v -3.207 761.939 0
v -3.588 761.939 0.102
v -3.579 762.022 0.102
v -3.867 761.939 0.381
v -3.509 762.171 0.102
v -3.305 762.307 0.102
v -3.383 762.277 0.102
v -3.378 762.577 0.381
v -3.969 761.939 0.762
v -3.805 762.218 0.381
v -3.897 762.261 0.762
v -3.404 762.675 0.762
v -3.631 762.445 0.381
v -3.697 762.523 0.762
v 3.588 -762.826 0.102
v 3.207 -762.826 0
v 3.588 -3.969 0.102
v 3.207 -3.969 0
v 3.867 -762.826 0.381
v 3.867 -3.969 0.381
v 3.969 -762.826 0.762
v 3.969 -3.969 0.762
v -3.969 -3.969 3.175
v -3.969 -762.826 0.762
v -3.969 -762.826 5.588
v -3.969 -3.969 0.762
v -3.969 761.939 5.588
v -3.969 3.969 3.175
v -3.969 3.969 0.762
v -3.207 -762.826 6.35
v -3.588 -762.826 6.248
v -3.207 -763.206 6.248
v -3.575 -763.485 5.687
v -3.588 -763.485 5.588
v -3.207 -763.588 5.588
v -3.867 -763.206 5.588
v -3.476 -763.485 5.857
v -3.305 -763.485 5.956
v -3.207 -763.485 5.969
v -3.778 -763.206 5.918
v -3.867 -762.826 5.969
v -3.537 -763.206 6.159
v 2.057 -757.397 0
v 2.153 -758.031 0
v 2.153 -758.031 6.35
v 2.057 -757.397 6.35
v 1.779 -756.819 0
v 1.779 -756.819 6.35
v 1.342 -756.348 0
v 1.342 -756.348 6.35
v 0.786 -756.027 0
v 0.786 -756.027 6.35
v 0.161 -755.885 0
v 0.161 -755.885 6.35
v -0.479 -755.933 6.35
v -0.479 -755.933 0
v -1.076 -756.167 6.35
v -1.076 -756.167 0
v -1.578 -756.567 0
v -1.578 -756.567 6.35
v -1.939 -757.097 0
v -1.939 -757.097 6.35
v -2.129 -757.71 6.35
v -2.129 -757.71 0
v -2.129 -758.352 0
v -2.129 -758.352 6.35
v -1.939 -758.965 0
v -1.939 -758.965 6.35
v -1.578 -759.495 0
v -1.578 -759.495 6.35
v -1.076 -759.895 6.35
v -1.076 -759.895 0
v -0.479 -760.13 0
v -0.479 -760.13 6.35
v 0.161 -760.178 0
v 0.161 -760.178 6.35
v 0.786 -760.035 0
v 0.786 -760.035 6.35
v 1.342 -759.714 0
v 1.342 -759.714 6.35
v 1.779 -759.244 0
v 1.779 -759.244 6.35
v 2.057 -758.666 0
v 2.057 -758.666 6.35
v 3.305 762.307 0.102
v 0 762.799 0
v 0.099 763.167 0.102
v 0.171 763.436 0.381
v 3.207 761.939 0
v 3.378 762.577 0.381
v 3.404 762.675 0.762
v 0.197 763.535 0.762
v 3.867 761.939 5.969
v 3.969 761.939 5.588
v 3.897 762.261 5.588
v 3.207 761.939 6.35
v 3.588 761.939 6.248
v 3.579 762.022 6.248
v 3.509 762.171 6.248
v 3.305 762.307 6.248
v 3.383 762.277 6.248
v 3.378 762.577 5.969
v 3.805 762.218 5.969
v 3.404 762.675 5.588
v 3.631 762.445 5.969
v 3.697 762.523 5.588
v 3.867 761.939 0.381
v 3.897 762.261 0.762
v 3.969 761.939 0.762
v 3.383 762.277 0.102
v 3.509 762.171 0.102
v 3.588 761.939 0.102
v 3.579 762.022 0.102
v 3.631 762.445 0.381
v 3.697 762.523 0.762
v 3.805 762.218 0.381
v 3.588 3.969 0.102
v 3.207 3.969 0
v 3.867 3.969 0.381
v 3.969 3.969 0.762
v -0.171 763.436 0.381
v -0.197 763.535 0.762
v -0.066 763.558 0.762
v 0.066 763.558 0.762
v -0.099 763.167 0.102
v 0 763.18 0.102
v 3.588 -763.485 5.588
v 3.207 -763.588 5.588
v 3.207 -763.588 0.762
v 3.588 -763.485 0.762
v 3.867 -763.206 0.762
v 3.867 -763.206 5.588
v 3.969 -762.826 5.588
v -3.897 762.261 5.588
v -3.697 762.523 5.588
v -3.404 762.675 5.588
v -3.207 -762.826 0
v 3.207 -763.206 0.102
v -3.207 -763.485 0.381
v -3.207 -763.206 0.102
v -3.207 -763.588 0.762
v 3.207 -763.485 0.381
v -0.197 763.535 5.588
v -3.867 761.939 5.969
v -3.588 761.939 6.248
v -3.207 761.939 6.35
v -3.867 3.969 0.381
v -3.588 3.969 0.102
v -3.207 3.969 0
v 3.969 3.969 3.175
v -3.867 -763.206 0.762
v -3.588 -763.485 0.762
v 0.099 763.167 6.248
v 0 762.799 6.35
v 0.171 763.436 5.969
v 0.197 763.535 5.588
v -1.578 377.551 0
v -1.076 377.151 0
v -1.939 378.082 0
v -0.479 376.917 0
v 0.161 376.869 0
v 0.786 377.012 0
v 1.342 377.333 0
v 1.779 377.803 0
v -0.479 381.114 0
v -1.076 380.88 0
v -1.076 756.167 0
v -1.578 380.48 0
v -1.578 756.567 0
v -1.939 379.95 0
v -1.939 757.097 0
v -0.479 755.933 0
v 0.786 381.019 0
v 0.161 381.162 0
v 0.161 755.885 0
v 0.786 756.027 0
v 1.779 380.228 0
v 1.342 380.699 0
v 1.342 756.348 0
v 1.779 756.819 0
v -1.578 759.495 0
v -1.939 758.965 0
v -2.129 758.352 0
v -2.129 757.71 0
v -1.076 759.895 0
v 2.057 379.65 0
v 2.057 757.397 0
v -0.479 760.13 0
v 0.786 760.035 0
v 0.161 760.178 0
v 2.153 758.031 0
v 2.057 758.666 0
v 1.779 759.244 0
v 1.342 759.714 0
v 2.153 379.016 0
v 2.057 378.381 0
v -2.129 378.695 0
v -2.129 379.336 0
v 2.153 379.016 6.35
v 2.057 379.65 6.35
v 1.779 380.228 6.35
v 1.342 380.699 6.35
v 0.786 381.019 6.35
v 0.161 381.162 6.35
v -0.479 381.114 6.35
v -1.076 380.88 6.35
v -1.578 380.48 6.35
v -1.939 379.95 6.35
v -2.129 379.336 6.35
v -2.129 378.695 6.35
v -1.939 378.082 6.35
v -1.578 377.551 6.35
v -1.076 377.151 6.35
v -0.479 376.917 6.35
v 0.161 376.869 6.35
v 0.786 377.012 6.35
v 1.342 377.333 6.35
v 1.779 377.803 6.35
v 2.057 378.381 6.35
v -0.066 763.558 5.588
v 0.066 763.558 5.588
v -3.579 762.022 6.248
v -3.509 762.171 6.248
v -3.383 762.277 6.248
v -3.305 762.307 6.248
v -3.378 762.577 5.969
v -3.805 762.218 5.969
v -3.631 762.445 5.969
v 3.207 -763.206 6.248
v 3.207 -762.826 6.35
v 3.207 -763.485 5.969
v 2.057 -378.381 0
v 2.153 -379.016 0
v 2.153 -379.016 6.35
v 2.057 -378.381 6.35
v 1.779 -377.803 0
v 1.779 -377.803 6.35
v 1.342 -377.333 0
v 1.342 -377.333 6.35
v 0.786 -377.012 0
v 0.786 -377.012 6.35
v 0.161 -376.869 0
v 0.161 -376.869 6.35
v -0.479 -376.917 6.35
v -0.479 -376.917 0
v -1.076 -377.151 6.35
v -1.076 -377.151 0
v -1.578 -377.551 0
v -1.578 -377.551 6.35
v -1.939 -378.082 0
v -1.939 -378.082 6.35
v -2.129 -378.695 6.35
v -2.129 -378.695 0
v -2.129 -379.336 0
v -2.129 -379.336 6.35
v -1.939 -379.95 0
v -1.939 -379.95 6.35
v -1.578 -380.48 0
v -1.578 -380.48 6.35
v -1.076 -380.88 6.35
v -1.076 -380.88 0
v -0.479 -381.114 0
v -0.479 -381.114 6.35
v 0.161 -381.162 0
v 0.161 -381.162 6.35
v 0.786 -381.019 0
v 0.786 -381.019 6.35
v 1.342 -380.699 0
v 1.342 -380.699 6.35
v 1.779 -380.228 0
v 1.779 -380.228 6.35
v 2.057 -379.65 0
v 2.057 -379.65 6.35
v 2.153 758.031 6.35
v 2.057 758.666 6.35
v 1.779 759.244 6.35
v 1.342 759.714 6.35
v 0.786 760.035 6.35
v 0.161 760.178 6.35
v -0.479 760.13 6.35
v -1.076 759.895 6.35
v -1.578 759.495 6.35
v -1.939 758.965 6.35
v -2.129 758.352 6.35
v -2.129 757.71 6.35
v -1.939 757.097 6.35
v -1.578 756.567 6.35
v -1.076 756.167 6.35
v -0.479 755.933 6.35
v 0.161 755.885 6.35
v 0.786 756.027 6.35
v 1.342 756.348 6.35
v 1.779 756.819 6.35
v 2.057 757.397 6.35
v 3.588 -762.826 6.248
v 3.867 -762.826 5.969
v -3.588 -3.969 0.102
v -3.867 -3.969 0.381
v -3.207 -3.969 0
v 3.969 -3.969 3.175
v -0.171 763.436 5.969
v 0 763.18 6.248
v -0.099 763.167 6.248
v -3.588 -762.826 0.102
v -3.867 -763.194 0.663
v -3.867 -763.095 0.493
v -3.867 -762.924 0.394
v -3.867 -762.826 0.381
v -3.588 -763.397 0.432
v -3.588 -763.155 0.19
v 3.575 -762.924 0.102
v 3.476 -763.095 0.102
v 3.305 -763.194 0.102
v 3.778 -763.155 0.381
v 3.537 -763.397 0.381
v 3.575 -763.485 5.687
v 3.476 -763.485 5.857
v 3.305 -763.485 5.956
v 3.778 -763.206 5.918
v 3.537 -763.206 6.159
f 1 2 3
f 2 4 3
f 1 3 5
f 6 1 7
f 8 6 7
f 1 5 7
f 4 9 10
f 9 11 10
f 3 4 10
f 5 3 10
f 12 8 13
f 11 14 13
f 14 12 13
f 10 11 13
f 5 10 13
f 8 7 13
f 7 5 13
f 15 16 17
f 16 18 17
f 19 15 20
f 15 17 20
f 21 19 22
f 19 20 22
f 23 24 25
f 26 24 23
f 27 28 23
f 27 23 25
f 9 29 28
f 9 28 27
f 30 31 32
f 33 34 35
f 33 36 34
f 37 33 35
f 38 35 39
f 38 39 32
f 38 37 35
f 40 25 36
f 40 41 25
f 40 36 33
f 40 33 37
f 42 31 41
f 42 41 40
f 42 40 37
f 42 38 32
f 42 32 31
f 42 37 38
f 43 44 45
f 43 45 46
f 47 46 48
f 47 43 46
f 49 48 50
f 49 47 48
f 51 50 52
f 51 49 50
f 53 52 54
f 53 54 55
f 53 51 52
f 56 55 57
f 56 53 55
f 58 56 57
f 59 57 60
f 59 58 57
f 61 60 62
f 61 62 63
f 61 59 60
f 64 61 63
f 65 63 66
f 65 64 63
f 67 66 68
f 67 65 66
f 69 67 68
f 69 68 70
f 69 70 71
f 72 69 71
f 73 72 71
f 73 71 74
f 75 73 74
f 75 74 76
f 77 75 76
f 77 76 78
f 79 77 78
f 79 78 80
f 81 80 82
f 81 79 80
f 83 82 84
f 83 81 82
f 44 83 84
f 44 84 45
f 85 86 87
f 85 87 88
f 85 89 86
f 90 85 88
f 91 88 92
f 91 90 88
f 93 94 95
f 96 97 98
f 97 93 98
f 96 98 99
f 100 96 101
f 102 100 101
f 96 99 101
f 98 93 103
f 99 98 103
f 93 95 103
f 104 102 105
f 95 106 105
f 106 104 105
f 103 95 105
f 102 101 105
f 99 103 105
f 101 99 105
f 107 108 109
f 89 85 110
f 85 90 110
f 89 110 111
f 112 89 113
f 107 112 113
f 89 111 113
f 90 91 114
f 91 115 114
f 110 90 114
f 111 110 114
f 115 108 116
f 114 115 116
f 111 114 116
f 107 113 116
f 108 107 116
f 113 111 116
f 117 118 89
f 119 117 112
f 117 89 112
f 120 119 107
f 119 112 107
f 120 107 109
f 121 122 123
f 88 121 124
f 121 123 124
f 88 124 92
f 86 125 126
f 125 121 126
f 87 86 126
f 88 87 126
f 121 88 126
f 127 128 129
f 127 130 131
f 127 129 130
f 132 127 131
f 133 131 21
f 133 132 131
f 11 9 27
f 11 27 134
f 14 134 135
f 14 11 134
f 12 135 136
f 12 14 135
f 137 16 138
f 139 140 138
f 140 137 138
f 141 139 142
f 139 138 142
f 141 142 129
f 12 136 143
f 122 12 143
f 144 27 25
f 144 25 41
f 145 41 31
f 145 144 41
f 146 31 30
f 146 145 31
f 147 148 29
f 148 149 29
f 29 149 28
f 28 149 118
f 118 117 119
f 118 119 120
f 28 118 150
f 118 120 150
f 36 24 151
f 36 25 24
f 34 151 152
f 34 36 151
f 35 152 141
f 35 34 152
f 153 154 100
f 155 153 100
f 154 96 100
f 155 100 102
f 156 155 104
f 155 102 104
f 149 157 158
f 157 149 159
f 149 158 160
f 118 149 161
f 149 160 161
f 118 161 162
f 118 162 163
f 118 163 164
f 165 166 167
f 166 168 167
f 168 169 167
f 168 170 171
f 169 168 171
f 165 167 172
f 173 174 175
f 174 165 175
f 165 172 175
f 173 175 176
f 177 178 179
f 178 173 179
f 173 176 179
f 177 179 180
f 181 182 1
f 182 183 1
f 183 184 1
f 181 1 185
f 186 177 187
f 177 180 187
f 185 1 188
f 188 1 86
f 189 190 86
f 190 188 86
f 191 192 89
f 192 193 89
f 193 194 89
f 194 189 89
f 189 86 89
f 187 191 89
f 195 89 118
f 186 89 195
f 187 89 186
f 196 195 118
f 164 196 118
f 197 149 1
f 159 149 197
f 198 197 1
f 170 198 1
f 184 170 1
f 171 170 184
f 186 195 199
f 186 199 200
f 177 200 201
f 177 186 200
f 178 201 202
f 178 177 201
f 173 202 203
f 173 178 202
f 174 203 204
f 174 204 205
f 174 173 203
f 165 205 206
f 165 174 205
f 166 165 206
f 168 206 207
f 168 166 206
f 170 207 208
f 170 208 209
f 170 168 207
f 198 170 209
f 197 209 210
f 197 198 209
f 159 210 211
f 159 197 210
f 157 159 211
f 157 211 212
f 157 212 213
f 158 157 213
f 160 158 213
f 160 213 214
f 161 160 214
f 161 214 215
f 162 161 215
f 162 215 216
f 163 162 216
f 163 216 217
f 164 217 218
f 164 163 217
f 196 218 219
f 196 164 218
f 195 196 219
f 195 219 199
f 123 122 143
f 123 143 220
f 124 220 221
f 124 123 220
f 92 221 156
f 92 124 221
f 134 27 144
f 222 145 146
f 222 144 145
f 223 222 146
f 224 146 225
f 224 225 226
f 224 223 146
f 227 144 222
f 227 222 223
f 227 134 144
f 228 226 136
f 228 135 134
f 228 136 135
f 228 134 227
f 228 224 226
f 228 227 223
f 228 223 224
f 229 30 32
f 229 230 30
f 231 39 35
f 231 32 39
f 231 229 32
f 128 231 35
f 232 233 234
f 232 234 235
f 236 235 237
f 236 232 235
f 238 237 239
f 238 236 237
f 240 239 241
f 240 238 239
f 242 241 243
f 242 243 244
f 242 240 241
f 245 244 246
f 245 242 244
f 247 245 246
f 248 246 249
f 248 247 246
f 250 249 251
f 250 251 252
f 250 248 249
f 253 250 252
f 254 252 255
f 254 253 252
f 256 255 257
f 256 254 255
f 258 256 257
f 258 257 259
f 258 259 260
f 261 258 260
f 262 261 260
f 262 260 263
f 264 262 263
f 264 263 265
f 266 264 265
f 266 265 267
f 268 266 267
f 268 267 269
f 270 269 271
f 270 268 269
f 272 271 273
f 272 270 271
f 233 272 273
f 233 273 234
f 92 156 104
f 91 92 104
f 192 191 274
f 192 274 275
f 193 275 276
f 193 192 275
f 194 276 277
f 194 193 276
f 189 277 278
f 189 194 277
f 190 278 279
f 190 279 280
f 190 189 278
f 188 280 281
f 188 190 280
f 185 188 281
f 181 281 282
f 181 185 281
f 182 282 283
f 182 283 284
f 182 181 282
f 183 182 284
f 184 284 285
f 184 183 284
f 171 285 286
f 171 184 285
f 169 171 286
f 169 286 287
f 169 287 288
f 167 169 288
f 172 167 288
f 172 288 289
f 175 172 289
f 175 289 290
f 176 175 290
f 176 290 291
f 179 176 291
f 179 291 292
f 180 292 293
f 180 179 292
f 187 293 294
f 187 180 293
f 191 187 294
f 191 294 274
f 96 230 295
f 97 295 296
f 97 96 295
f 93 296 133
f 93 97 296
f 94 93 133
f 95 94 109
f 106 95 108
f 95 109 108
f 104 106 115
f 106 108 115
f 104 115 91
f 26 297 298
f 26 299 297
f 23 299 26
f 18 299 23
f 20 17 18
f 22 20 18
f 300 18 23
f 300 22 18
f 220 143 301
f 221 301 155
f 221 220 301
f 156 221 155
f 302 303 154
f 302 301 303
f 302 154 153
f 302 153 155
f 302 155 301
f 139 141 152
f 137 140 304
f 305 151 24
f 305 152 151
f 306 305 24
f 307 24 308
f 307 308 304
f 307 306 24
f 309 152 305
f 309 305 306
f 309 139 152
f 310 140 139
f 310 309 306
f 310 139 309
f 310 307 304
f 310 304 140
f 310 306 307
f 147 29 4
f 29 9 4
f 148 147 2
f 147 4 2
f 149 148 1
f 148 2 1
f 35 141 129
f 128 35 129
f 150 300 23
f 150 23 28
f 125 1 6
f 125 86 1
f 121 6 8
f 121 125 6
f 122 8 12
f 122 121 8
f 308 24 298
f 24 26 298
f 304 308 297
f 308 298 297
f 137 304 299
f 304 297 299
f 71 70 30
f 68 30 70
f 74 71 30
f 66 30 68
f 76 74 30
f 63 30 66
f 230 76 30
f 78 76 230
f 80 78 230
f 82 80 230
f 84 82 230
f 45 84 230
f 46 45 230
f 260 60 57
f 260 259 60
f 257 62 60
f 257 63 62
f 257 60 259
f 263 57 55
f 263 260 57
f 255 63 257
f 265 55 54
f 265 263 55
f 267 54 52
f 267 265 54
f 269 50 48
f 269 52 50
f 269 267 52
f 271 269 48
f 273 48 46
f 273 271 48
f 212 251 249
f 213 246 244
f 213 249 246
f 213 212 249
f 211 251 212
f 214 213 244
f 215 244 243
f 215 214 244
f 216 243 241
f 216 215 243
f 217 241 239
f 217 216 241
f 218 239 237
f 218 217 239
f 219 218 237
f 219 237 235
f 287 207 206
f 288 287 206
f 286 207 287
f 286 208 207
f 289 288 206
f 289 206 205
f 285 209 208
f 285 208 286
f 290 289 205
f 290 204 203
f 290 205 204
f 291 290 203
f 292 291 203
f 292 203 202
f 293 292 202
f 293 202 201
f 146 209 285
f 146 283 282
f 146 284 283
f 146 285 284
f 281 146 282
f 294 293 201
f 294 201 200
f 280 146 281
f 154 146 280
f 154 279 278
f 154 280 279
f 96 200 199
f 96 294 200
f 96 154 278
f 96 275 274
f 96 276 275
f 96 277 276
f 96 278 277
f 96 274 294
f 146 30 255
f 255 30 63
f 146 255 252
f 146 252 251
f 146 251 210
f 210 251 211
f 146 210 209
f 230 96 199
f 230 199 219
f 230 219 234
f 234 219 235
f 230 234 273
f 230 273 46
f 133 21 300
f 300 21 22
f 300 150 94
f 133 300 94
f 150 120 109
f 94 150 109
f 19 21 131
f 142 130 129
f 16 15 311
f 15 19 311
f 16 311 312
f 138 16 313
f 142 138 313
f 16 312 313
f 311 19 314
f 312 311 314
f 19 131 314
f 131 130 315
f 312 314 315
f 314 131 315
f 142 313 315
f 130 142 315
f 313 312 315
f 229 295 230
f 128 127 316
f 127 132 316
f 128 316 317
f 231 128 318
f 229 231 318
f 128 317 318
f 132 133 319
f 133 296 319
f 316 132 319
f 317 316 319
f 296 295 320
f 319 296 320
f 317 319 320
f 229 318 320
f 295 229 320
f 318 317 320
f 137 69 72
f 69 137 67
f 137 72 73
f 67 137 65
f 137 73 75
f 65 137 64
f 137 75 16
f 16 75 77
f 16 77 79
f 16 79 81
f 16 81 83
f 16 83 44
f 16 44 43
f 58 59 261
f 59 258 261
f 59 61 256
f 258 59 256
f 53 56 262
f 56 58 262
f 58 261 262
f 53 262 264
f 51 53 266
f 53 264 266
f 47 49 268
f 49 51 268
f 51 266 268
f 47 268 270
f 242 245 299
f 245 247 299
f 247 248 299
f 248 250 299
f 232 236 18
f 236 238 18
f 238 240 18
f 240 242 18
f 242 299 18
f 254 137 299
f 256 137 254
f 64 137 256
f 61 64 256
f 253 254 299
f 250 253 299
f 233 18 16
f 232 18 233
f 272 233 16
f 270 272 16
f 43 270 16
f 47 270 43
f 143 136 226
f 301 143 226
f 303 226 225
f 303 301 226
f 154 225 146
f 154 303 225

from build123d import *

# Parameters (mm, degrees)
F0_W     = 7.9375
F0_H     = 1527.175
F0_R     = 2.15265
F1_DEPTH = 6.35
F2_W     = 7.9375
F2_H     = 3.175
F3_DEPTH = 7.9375
F5_DEPTH = 6.35
F6_R     = 0.762


with BuildPart() as f1:
    # F0 (on Top) → F1 (new body)
    with BuildSketch(Plane.XY):
        Rectangle(F0_W, F0_H)
        with Locations((0, -758.03125)):
            Circle(F0_R, mode=Mode.SUBTRACT)
        with Locations((0, -379.015625)):
            Circle(F0_R, mode=Mode.SUBTRACT)
        with Locations((0, 379.015625)):
            Circle(F0_R, mode=Mode.SUBTRACT)
        with Locations((0, 758.03125)):
            Circle(F0_R, mode=Mode.SUBTRACT)
    extrude(amount=F1_DEPTH)

    # F2 (on face) → F3 (cut, through all)
    with BuildSketch(Plane.YZ.offset(3.96875)):
        with Locations((0, 1.5875)):
            Rectangle(F2_W, F2_H)
    extrude(amount=-F3_DEPTH, mode=Mode.SUBTRACT)

    # F4 (on face) → F5 (cut, through all)
    with BuildSketch(Plane.XY.offset(6.35)):
        Polygon((-3.96875, 762.5240766425), (0, 763.5875), (3.96875, 762.5240766425), (3.96875, 770.4615766425), (-3.96875, 770.4615766425), align=None)
    extrude(amount=-F5_DEPTH, mode=Mode.SUBTRACT)

    # F6
    f6_edges = [f1.edges().sort_by_distance(p)[0] for p in [
        (-1.984375, 763.055788, 6.35),
        (1.984375, 763.055788, 6.35),
        (0, 763.5875, 3.175),
        (3.96875, 762.524077, 3.175),
        (-3.96875, 762.524077, 3.175),
        (-3.96875, -0.531712, 6.35),
        (3.96875, -0.531712, 6.35),
        (-3.96875, 383.246413, 0),
        (-1.984375, 763.055788, 0),
        (1.984375, 763.055788, 0),
        (3.96875, 383.246413, 0),
        (3.96875, -763.5875, 3.175),
        (3.96875, -383.778125, 0),
        (0, -763.5875, 0),
        (-3.96875, -763.5875, 3.175),
        (0, -763.5875, 6.35),
        (-3.96875, -383.778125, 0),
    ]]
    fillet(f6_edges, radius=F6_R)


solid = f1.part
